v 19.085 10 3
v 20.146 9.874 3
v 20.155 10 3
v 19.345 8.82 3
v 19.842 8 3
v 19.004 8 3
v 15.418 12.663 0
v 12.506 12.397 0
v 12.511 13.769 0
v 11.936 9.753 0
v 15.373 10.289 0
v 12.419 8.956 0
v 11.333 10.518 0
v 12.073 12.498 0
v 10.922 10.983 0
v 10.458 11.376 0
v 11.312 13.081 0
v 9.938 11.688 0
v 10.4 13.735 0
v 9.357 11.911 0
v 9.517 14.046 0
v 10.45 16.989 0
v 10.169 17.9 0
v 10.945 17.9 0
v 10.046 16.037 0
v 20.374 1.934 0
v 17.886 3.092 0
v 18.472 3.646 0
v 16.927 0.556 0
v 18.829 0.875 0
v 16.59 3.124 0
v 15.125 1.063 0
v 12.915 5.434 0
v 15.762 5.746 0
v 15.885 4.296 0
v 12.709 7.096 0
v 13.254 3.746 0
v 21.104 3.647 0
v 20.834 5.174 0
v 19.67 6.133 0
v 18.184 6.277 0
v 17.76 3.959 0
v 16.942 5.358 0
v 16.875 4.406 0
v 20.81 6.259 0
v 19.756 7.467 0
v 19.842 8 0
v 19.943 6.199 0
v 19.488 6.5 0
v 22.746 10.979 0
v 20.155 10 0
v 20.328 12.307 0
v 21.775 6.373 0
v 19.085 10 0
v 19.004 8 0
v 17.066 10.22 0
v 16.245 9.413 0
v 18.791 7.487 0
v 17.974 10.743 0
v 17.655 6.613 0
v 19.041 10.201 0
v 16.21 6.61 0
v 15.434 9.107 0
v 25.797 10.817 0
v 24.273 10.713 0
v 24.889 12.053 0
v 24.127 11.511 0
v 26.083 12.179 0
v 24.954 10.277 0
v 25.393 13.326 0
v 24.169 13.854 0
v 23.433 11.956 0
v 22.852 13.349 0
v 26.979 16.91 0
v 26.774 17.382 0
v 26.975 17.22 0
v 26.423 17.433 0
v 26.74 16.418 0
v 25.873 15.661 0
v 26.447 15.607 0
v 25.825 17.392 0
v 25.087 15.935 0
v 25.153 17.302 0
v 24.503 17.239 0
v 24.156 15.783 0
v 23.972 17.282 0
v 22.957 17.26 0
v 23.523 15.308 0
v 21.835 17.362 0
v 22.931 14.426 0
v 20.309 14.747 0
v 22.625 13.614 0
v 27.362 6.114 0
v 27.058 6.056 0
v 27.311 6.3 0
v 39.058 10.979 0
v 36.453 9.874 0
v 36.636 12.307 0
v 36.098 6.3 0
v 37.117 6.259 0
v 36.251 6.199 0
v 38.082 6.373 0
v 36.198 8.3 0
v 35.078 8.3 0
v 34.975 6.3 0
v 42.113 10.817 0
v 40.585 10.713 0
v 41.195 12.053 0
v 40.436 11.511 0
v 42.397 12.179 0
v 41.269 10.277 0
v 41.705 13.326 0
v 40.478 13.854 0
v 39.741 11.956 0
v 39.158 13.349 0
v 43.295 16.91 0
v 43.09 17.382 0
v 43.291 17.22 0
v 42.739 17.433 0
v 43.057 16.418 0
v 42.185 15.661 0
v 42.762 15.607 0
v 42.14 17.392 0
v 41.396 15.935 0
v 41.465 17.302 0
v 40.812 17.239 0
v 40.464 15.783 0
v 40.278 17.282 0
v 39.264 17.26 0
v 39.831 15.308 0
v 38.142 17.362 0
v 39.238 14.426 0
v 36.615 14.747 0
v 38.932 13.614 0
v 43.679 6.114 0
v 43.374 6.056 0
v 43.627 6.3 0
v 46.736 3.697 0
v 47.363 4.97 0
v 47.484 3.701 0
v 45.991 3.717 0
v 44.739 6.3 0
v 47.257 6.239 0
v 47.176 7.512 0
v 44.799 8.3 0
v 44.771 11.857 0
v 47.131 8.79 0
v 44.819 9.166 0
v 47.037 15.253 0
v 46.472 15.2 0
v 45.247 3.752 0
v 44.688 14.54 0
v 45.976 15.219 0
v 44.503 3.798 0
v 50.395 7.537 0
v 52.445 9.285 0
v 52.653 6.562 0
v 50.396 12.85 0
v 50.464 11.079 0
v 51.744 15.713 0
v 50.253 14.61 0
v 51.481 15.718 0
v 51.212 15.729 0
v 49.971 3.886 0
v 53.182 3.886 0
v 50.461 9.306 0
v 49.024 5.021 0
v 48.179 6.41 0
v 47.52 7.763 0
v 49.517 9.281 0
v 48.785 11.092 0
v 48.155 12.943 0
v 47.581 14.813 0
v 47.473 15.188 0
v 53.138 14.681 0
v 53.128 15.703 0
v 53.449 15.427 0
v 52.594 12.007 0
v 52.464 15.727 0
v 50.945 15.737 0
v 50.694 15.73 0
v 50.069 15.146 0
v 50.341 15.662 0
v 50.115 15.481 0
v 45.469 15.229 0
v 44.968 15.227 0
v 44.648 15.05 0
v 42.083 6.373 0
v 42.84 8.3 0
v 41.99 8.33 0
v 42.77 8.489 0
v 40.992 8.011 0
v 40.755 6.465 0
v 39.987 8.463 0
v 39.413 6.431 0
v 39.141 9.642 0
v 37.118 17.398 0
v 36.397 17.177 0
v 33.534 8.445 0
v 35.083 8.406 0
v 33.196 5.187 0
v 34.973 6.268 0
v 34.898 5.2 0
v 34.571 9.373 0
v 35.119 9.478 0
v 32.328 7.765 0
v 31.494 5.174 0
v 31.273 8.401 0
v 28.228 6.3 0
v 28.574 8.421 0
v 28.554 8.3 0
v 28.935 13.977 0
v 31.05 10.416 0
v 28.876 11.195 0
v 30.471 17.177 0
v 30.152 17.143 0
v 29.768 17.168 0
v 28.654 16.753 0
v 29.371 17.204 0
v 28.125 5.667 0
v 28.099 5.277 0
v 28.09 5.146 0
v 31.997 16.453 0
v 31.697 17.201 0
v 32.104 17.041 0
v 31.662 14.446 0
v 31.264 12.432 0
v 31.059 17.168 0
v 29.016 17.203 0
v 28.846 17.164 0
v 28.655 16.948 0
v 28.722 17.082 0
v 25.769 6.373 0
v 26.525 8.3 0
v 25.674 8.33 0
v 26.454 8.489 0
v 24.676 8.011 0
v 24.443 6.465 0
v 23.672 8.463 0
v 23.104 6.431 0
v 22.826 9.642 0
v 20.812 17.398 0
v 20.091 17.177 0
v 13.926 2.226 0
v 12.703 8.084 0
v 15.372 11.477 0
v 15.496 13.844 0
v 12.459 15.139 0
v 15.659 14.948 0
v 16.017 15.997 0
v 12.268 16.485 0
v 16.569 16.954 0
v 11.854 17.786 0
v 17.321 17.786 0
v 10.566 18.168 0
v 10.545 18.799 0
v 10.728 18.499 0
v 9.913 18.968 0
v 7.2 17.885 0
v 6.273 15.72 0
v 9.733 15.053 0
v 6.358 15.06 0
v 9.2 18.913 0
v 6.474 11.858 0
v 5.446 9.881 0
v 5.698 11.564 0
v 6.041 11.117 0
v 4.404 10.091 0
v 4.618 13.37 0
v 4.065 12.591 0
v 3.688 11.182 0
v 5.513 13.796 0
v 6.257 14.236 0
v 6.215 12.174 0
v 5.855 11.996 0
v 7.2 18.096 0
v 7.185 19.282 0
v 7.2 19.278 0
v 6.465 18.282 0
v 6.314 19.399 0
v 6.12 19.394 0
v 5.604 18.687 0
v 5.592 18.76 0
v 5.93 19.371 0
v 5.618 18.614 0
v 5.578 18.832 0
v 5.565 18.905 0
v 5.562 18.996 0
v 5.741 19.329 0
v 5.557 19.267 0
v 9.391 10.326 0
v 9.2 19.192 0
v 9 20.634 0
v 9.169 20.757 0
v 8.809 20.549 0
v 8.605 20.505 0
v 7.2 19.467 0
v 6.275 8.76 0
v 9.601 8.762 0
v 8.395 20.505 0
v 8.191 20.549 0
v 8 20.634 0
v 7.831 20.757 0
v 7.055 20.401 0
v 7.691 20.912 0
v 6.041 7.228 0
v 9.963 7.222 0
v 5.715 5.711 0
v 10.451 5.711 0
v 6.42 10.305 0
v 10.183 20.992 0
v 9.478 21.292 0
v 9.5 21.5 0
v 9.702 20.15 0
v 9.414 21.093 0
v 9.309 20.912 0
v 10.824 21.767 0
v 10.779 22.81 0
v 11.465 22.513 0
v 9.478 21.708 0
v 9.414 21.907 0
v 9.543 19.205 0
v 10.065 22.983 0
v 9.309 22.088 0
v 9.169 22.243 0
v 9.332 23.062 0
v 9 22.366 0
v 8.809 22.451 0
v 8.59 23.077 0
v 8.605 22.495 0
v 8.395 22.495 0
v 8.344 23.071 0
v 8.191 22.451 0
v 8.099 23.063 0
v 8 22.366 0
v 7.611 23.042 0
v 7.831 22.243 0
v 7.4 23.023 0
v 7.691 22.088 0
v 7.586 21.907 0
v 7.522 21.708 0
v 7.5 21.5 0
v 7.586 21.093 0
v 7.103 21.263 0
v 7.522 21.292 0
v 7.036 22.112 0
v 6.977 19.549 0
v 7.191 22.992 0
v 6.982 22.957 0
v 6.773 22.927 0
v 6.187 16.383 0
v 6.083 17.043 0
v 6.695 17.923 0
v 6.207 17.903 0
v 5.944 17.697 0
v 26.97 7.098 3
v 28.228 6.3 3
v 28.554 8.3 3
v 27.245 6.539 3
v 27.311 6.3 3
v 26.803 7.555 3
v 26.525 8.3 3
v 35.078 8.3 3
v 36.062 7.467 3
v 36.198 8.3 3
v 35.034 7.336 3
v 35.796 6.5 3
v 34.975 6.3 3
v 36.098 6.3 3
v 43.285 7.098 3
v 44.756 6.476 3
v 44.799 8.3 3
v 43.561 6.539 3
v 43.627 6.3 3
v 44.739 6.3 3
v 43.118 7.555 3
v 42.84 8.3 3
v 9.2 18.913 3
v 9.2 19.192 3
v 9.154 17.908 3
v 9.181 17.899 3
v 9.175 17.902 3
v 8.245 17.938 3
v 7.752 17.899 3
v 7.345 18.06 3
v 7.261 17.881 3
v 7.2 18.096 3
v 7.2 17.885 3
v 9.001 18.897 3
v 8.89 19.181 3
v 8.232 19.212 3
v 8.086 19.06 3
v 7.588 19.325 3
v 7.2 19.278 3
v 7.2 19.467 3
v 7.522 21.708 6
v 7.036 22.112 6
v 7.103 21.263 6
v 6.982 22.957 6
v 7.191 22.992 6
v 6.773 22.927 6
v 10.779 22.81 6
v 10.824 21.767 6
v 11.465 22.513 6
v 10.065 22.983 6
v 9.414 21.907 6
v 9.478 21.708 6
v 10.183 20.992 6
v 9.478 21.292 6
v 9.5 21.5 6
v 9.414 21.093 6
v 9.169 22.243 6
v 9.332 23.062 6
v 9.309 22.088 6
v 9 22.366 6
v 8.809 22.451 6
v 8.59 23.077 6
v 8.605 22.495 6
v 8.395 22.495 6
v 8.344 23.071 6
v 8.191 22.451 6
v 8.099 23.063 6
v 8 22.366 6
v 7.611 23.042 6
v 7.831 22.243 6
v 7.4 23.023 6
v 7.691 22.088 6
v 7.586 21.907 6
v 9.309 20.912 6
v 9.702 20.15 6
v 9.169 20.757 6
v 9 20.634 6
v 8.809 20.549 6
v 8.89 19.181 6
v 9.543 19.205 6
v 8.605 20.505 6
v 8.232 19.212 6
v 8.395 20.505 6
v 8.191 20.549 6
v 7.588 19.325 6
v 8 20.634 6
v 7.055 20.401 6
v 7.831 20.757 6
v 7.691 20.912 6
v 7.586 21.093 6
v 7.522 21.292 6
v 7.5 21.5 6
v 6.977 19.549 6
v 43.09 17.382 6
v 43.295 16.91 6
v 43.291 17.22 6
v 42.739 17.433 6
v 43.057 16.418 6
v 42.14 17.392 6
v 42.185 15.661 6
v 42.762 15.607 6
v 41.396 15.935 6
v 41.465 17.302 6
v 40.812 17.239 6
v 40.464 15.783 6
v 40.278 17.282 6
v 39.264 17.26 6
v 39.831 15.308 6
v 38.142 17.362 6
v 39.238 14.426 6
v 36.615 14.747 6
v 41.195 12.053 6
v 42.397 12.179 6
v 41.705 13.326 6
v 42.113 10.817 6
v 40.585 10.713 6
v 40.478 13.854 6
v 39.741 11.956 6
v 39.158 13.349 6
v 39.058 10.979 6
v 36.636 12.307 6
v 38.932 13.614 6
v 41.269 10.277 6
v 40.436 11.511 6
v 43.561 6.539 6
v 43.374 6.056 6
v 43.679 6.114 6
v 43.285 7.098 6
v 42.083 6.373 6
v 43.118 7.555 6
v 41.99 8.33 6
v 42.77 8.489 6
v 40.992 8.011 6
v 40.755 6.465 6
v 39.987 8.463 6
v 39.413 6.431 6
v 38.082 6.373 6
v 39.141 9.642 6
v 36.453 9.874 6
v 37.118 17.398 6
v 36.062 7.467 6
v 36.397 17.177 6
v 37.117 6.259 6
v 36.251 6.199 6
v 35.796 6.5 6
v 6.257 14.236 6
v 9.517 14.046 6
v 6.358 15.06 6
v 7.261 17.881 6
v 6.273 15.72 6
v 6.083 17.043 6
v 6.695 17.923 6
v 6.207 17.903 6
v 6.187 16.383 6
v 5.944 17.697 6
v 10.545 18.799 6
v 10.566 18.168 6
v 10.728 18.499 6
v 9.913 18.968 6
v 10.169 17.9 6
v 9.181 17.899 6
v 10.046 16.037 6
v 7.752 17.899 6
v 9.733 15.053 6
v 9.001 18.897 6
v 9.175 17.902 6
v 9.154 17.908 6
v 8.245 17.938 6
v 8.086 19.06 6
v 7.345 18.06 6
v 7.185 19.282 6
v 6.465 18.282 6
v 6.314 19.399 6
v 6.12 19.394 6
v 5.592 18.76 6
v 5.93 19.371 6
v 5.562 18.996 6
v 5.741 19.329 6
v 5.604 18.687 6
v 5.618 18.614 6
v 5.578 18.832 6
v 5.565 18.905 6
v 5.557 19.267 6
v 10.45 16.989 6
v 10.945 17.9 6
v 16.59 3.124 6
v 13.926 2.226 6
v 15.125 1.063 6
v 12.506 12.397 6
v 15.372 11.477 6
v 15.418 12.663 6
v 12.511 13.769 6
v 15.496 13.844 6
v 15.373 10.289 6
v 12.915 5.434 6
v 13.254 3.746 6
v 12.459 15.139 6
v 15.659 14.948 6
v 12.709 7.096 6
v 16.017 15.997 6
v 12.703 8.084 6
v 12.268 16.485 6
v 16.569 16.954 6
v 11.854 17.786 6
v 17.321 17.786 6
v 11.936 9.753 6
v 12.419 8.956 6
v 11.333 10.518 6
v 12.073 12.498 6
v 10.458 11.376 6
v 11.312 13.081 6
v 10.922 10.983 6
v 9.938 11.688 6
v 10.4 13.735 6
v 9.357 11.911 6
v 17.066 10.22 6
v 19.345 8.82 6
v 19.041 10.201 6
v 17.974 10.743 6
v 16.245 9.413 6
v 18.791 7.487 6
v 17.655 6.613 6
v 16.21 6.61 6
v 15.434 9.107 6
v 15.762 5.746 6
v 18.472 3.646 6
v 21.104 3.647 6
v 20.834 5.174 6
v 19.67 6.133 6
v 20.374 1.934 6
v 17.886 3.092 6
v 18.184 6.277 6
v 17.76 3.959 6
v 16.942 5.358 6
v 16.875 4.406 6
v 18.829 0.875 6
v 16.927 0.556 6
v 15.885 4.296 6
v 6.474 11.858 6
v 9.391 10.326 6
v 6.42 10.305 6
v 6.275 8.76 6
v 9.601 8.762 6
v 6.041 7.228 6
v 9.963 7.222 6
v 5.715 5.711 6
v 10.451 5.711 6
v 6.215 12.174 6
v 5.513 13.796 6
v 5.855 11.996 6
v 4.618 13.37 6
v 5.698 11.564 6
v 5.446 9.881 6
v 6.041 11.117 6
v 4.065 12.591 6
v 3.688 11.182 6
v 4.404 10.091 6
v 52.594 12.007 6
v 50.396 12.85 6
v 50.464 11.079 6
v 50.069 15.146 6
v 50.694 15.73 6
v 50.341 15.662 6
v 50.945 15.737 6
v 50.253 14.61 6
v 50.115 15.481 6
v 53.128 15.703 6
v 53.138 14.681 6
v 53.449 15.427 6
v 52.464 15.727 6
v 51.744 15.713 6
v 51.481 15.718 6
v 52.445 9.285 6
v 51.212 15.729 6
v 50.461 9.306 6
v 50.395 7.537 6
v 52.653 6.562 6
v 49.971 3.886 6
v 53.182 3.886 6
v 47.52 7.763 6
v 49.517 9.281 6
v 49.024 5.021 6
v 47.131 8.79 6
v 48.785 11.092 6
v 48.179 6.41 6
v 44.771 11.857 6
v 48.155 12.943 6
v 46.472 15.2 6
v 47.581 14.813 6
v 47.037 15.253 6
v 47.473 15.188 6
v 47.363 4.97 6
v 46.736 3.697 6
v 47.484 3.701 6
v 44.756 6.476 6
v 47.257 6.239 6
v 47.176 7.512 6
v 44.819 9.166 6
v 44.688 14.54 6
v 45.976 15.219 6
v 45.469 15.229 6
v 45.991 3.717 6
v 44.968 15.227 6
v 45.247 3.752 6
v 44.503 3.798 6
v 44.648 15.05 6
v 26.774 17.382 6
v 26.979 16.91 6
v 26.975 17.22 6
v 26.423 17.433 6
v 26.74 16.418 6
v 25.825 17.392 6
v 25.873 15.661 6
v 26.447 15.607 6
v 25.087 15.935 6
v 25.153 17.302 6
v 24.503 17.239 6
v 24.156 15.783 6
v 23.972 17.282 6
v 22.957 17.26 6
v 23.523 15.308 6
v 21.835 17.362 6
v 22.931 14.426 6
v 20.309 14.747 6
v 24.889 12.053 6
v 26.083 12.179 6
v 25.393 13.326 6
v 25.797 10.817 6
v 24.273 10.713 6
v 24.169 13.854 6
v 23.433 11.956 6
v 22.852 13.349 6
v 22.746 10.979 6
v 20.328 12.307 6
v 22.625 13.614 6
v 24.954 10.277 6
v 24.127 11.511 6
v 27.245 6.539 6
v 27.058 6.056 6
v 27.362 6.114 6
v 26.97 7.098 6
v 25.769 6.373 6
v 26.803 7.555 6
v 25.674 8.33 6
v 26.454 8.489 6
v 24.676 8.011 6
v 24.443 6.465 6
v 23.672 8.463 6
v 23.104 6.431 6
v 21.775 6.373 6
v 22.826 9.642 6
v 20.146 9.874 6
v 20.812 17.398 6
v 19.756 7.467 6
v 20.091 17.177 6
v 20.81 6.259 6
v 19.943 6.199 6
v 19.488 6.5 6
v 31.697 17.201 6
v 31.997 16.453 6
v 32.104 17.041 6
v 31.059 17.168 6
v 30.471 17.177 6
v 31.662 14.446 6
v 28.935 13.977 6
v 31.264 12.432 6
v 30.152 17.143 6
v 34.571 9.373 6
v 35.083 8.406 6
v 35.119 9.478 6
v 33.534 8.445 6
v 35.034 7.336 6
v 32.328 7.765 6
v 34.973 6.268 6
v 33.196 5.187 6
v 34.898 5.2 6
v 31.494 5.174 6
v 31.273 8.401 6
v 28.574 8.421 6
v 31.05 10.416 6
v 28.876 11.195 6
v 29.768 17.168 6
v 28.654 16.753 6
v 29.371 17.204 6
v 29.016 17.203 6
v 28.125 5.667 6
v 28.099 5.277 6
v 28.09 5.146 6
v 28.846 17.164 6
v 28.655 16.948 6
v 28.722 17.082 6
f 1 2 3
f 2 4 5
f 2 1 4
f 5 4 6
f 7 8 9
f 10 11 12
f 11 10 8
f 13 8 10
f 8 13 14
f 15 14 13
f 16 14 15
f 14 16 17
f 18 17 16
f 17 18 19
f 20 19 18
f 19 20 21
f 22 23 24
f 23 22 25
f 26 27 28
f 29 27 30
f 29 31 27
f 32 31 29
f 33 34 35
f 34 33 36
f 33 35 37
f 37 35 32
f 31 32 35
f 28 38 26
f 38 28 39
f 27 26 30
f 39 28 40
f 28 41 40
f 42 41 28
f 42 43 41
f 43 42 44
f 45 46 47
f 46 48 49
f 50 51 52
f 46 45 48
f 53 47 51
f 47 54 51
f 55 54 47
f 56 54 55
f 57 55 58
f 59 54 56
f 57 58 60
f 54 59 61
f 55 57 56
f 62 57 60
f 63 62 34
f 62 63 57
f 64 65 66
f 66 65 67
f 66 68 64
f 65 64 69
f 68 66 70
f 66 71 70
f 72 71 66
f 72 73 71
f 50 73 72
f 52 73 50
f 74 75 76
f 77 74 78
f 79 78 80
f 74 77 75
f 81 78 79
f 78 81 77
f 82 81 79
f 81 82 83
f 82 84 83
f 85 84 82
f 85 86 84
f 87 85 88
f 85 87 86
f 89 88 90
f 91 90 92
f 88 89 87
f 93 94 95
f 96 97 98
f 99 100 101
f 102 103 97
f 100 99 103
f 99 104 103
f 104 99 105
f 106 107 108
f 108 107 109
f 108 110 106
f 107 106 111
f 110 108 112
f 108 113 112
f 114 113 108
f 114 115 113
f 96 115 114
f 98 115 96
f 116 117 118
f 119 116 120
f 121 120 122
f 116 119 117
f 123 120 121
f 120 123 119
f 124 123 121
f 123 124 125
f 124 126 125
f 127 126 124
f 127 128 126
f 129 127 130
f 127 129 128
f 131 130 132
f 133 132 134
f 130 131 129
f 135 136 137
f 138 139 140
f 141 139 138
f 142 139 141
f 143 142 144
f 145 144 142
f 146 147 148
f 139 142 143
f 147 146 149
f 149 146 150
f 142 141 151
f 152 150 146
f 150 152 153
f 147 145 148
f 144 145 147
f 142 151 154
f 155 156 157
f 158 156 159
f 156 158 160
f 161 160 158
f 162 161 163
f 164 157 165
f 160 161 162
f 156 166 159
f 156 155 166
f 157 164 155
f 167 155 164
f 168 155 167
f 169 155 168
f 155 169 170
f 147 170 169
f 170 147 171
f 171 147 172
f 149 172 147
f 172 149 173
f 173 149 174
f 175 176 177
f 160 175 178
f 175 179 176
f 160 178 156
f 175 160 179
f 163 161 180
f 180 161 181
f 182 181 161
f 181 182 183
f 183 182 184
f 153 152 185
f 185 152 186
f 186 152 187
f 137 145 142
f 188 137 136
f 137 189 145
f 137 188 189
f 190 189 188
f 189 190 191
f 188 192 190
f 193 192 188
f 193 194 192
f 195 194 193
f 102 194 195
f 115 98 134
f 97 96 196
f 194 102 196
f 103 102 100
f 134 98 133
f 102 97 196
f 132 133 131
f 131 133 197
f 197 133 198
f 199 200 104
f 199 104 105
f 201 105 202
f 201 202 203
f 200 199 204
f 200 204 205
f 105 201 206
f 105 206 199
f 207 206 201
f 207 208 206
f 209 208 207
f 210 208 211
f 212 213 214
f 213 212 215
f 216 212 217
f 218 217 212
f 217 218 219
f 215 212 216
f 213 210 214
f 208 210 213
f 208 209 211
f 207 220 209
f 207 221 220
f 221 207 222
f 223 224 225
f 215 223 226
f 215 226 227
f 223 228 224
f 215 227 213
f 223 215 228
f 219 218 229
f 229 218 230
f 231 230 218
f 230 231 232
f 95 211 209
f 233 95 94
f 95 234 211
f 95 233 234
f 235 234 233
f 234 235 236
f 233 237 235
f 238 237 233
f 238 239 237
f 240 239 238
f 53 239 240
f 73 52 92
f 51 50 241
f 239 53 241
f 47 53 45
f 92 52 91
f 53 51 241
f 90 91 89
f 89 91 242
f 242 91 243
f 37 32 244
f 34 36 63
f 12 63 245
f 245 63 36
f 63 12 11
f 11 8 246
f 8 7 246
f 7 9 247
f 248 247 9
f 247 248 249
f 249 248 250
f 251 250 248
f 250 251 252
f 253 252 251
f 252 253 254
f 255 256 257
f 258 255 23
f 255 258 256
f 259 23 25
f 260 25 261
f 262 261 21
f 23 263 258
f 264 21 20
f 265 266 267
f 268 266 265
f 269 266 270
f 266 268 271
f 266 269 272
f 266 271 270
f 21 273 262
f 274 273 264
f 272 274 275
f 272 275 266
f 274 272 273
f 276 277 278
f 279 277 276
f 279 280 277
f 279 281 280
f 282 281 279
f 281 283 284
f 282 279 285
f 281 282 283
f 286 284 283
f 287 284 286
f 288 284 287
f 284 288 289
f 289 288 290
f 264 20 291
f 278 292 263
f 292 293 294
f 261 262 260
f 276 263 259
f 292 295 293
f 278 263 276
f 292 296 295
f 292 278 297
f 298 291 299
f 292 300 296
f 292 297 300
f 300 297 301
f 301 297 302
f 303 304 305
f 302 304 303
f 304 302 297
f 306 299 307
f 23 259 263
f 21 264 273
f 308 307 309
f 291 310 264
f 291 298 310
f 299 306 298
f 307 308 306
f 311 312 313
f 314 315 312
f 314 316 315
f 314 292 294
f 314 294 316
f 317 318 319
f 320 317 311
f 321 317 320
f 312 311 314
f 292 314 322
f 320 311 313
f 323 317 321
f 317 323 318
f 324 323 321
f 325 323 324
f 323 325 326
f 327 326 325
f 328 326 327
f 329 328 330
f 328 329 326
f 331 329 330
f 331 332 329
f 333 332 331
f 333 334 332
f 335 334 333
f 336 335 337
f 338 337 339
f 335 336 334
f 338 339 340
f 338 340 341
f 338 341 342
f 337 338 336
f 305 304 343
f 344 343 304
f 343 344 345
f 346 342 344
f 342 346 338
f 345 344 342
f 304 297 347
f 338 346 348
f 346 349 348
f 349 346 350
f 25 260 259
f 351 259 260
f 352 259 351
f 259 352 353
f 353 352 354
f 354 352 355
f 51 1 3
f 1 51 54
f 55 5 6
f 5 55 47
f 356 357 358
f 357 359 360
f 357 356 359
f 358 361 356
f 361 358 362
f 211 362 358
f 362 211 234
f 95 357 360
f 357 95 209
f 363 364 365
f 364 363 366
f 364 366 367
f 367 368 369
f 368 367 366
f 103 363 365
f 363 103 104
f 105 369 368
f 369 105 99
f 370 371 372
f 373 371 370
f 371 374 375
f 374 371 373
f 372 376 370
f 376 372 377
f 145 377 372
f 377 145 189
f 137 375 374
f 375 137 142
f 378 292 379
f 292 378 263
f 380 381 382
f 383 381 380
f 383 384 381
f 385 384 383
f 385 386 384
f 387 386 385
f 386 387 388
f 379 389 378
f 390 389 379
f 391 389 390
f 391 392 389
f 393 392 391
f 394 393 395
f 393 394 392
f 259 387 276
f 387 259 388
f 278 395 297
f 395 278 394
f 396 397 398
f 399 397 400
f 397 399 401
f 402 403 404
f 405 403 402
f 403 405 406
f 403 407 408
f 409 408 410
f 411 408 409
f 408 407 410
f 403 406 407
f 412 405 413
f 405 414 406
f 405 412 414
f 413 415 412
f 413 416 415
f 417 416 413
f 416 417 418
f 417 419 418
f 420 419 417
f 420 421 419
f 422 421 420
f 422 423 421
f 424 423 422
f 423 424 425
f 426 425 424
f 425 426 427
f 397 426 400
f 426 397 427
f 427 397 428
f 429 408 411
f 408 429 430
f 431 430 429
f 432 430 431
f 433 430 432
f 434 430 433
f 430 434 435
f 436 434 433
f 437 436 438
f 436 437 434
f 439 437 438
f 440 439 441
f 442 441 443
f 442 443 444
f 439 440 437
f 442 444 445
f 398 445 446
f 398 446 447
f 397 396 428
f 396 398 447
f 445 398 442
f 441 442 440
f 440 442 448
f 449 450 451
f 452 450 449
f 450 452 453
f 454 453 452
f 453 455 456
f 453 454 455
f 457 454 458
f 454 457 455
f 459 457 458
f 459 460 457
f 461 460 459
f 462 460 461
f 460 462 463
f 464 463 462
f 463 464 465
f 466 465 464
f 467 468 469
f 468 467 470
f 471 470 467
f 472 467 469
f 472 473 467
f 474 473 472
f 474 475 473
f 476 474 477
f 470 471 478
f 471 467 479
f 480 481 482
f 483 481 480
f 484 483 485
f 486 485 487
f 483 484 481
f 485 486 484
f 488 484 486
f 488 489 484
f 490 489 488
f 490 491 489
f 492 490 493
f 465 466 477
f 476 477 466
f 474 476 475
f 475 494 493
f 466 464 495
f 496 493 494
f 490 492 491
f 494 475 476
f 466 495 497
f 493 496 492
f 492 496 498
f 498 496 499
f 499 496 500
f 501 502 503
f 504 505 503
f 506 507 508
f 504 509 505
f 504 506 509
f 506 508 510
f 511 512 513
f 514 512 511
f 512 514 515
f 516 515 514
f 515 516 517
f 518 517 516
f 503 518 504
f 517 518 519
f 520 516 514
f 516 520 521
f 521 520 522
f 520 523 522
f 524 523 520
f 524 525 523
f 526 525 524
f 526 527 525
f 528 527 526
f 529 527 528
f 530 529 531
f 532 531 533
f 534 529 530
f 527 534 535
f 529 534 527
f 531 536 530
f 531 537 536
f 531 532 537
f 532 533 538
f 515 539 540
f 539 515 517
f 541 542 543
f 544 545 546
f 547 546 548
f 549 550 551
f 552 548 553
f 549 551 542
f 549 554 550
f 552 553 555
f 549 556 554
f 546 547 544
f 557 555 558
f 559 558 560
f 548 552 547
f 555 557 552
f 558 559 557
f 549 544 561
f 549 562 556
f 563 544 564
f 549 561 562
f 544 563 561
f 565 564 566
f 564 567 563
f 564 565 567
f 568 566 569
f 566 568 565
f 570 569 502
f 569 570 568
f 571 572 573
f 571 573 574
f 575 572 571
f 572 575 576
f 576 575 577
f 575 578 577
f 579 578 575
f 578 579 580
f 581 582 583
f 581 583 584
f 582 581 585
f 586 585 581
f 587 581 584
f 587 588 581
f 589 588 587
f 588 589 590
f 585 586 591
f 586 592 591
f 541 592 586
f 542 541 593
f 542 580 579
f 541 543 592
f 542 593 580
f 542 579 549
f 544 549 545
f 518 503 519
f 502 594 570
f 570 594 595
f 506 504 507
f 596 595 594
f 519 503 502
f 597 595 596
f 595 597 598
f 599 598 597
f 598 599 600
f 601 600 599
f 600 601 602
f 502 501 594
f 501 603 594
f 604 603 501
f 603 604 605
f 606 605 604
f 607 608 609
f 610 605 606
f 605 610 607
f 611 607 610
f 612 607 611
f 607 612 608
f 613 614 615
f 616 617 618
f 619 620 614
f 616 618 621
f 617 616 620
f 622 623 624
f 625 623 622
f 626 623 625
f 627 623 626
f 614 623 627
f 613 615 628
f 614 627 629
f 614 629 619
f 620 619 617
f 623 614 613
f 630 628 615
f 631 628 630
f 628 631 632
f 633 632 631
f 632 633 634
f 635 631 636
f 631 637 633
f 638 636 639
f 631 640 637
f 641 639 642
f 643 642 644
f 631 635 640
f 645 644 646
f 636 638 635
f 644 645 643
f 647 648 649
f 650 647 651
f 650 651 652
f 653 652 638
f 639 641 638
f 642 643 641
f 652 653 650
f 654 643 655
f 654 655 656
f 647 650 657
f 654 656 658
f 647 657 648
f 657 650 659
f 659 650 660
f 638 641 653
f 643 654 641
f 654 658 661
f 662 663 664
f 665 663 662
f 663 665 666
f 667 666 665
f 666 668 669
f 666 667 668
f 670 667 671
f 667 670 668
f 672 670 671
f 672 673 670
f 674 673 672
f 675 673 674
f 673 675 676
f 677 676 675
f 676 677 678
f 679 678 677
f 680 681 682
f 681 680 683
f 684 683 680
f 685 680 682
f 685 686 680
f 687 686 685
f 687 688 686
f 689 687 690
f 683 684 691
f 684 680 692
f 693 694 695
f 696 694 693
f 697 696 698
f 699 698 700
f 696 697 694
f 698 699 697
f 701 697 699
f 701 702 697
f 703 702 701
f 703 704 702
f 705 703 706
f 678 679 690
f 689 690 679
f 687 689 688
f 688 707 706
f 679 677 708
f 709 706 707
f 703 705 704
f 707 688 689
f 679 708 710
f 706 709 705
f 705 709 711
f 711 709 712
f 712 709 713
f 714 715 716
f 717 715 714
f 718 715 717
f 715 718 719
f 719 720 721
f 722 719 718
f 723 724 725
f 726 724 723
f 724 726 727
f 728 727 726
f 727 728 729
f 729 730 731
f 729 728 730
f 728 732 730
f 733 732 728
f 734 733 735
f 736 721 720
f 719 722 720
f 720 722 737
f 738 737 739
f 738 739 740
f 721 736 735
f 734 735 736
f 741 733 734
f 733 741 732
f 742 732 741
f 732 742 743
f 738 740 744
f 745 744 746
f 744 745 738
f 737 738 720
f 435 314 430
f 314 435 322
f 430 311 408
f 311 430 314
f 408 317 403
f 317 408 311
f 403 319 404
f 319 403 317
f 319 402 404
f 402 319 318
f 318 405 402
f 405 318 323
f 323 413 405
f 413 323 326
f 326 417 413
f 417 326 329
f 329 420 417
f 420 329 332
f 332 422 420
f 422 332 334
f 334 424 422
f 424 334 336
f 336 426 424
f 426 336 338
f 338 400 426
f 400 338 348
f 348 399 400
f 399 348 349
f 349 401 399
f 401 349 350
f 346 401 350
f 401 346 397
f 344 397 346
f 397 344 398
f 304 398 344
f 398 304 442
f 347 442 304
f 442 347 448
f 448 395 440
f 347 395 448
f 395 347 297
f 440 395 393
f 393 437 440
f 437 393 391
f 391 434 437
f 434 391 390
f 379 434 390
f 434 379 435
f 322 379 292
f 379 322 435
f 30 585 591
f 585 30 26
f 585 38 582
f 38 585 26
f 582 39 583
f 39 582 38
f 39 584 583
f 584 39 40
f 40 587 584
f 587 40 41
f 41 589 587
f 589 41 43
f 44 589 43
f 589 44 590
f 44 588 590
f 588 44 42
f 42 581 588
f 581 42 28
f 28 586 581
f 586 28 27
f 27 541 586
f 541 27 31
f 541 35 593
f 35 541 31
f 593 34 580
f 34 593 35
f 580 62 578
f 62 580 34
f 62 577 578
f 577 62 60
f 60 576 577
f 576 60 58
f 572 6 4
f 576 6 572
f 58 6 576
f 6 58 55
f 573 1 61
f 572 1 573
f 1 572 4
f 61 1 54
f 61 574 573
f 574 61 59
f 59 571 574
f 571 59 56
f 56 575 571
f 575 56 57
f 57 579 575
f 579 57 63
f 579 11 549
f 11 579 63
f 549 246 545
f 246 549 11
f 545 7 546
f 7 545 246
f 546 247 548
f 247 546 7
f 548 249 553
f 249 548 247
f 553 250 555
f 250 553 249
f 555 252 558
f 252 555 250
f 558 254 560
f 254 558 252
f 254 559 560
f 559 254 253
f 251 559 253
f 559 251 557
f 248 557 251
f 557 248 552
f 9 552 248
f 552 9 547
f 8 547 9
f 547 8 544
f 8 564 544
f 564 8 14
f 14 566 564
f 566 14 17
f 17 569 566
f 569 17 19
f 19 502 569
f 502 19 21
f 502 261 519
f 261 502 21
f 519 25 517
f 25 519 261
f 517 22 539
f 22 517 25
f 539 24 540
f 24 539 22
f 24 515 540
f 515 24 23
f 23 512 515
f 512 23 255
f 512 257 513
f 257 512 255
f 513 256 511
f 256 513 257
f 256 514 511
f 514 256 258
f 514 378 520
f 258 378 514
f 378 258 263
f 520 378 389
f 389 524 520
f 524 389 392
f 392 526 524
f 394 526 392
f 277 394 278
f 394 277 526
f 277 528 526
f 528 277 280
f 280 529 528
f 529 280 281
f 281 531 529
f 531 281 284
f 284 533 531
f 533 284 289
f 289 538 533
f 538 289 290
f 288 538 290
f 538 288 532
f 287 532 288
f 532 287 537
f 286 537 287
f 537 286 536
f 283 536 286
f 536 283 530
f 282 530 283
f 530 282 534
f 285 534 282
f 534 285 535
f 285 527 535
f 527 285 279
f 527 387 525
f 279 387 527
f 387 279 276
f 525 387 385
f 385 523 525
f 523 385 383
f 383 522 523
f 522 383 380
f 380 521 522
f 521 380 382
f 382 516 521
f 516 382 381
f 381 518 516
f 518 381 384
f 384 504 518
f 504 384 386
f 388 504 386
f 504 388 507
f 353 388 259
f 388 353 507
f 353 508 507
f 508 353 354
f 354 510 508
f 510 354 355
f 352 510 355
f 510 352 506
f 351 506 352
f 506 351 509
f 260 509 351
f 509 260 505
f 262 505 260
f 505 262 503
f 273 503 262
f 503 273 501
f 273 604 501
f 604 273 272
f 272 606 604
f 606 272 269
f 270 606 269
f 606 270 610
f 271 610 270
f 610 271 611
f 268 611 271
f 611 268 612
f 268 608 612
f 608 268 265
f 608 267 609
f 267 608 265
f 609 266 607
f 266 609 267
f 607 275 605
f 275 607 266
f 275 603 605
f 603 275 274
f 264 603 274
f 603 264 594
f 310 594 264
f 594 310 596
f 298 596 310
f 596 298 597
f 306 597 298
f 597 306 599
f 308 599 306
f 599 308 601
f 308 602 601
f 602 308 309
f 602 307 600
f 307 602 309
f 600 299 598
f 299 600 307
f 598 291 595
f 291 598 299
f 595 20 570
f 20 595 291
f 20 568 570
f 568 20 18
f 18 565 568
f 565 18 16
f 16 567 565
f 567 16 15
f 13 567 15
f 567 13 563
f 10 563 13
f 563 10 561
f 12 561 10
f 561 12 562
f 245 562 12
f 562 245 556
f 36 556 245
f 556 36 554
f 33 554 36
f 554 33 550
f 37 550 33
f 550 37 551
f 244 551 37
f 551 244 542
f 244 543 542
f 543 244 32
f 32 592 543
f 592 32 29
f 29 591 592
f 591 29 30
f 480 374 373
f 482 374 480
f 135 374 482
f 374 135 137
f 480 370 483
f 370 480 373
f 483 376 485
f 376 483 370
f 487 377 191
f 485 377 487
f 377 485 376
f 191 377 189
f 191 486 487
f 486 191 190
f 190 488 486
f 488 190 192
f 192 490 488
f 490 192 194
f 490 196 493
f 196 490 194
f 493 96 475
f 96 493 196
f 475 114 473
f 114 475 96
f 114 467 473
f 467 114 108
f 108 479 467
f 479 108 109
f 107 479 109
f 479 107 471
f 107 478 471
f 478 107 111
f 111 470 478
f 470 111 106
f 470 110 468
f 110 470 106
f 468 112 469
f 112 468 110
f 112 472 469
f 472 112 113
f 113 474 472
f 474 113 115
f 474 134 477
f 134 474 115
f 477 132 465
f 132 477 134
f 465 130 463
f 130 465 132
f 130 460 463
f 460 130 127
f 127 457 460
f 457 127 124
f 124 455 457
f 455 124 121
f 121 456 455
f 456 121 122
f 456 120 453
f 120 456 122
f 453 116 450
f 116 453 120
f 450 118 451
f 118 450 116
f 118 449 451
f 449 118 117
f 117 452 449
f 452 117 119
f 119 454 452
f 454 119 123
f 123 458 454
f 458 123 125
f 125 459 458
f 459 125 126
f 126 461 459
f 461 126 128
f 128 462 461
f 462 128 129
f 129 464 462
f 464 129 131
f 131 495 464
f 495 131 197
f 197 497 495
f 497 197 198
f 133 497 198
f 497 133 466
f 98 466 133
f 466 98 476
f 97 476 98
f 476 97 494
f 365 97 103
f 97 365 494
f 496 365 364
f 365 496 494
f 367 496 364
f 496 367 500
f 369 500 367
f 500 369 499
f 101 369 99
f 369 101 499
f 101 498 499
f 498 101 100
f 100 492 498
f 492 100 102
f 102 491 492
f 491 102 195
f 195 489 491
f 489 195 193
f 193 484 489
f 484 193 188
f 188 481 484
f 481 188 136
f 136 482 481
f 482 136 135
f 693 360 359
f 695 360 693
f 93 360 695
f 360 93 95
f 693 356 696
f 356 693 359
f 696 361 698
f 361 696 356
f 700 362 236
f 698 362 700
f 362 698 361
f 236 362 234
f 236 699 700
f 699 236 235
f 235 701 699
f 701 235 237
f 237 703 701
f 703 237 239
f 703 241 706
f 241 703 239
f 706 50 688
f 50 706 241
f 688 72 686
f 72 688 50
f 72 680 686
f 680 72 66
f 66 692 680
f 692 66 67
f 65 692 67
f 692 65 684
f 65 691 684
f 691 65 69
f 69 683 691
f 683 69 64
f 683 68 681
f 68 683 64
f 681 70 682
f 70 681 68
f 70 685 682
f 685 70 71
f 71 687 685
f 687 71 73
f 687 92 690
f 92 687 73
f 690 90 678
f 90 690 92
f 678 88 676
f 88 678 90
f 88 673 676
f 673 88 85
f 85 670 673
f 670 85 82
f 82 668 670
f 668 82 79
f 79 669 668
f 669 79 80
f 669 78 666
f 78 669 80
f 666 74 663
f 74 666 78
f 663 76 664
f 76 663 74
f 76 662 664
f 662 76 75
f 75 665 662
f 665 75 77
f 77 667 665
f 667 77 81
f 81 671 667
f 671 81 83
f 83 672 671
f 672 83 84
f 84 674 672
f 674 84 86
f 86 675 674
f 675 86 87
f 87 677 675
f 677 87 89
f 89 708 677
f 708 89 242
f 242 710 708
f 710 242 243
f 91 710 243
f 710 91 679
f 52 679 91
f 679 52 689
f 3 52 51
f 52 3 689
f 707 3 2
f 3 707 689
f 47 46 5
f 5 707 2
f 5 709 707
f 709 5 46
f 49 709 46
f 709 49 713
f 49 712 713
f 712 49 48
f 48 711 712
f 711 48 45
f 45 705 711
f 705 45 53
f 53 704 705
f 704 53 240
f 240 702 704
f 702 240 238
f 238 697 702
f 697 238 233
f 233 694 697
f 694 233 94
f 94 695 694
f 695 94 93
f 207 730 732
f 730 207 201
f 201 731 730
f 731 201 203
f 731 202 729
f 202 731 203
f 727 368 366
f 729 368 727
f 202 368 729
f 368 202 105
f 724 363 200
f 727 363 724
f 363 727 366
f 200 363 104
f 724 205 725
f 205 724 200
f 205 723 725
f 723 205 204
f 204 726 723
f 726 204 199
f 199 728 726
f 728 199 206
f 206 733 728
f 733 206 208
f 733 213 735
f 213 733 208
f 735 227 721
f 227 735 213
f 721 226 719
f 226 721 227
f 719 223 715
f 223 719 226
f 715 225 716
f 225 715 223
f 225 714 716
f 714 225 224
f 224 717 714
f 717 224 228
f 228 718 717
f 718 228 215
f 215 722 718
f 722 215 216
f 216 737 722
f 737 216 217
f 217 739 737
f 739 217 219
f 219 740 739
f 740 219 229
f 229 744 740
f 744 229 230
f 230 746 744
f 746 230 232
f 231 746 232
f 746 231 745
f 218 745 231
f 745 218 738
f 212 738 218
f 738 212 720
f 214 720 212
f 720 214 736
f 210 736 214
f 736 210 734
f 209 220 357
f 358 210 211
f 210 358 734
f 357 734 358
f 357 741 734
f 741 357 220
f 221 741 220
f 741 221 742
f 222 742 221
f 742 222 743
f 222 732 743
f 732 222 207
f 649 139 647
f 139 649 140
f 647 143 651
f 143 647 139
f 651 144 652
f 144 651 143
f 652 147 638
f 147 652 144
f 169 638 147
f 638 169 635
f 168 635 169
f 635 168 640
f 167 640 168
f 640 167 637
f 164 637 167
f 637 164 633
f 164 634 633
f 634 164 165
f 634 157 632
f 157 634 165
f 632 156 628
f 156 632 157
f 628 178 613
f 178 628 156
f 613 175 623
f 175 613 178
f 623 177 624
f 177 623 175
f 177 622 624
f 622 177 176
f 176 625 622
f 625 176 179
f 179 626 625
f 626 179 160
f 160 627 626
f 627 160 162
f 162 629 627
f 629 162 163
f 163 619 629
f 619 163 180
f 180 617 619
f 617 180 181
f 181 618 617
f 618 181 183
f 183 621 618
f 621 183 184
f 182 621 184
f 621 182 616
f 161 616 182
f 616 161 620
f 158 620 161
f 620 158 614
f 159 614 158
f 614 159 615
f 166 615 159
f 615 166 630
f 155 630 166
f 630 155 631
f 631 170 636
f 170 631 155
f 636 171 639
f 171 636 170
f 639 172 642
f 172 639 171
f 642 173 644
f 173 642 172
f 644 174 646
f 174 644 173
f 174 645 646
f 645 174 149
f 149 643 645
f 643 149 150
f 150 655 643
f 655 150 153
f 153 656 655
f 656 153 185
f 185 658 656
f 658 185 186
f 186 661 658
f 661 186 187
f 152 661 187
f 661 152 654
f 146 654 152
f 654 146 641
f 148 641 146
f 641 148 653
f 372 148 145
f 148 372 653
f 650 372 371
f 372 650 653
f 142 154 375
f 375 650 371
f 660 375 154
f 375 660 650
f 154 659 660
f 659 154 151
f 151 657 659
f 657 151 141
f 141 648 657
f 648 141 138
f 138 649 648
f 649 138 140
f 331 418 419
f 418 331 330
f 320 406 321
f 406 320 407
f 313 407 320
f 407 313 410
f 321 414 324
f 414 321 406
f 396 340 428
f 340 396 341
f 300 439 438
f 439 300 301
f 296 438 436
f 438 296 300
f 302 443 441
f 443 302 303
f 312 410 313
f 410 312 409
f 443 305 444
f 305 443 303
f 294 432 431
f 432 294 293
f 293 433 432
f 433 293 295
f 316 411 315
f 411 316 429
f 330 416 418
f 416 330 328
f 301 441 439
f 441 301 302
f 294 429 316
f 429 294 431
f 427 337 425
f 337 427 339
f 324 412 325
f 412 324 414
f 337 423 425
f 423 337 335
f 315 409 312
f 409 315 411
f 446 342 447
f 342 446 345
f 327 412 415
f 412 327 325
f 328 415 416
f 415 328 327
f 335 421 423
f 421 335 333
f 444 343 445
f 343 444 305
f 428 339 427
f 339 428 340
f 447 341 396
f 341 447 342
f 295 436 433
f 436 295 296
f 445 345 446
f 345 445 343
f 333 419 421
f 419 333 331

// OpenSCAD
// Nametage template for helen.
// 

$fs=0.2;

difference () {
    union () {
        translate ([17,8,0]){cube([5,2,3]);}
        translate ([26.1,6.3,0]){cube([5,2,3]);}
        translate ([34,6.3,0]){cube([3,2,3]);}
        translate ([42.5,6.3,0]){cube([4,2,3]);}

        // and the hat
        translate ([7.2,17.5,0]){cube([2,2,3]);}



        linear_extrude(file = "helen.dxf", 
          height = 6, center = false, convexity = 10,  scale=1);
    }
    translate ([8.5,21.5,-0.1]){ cylinder(h=7,r=1);}
}
